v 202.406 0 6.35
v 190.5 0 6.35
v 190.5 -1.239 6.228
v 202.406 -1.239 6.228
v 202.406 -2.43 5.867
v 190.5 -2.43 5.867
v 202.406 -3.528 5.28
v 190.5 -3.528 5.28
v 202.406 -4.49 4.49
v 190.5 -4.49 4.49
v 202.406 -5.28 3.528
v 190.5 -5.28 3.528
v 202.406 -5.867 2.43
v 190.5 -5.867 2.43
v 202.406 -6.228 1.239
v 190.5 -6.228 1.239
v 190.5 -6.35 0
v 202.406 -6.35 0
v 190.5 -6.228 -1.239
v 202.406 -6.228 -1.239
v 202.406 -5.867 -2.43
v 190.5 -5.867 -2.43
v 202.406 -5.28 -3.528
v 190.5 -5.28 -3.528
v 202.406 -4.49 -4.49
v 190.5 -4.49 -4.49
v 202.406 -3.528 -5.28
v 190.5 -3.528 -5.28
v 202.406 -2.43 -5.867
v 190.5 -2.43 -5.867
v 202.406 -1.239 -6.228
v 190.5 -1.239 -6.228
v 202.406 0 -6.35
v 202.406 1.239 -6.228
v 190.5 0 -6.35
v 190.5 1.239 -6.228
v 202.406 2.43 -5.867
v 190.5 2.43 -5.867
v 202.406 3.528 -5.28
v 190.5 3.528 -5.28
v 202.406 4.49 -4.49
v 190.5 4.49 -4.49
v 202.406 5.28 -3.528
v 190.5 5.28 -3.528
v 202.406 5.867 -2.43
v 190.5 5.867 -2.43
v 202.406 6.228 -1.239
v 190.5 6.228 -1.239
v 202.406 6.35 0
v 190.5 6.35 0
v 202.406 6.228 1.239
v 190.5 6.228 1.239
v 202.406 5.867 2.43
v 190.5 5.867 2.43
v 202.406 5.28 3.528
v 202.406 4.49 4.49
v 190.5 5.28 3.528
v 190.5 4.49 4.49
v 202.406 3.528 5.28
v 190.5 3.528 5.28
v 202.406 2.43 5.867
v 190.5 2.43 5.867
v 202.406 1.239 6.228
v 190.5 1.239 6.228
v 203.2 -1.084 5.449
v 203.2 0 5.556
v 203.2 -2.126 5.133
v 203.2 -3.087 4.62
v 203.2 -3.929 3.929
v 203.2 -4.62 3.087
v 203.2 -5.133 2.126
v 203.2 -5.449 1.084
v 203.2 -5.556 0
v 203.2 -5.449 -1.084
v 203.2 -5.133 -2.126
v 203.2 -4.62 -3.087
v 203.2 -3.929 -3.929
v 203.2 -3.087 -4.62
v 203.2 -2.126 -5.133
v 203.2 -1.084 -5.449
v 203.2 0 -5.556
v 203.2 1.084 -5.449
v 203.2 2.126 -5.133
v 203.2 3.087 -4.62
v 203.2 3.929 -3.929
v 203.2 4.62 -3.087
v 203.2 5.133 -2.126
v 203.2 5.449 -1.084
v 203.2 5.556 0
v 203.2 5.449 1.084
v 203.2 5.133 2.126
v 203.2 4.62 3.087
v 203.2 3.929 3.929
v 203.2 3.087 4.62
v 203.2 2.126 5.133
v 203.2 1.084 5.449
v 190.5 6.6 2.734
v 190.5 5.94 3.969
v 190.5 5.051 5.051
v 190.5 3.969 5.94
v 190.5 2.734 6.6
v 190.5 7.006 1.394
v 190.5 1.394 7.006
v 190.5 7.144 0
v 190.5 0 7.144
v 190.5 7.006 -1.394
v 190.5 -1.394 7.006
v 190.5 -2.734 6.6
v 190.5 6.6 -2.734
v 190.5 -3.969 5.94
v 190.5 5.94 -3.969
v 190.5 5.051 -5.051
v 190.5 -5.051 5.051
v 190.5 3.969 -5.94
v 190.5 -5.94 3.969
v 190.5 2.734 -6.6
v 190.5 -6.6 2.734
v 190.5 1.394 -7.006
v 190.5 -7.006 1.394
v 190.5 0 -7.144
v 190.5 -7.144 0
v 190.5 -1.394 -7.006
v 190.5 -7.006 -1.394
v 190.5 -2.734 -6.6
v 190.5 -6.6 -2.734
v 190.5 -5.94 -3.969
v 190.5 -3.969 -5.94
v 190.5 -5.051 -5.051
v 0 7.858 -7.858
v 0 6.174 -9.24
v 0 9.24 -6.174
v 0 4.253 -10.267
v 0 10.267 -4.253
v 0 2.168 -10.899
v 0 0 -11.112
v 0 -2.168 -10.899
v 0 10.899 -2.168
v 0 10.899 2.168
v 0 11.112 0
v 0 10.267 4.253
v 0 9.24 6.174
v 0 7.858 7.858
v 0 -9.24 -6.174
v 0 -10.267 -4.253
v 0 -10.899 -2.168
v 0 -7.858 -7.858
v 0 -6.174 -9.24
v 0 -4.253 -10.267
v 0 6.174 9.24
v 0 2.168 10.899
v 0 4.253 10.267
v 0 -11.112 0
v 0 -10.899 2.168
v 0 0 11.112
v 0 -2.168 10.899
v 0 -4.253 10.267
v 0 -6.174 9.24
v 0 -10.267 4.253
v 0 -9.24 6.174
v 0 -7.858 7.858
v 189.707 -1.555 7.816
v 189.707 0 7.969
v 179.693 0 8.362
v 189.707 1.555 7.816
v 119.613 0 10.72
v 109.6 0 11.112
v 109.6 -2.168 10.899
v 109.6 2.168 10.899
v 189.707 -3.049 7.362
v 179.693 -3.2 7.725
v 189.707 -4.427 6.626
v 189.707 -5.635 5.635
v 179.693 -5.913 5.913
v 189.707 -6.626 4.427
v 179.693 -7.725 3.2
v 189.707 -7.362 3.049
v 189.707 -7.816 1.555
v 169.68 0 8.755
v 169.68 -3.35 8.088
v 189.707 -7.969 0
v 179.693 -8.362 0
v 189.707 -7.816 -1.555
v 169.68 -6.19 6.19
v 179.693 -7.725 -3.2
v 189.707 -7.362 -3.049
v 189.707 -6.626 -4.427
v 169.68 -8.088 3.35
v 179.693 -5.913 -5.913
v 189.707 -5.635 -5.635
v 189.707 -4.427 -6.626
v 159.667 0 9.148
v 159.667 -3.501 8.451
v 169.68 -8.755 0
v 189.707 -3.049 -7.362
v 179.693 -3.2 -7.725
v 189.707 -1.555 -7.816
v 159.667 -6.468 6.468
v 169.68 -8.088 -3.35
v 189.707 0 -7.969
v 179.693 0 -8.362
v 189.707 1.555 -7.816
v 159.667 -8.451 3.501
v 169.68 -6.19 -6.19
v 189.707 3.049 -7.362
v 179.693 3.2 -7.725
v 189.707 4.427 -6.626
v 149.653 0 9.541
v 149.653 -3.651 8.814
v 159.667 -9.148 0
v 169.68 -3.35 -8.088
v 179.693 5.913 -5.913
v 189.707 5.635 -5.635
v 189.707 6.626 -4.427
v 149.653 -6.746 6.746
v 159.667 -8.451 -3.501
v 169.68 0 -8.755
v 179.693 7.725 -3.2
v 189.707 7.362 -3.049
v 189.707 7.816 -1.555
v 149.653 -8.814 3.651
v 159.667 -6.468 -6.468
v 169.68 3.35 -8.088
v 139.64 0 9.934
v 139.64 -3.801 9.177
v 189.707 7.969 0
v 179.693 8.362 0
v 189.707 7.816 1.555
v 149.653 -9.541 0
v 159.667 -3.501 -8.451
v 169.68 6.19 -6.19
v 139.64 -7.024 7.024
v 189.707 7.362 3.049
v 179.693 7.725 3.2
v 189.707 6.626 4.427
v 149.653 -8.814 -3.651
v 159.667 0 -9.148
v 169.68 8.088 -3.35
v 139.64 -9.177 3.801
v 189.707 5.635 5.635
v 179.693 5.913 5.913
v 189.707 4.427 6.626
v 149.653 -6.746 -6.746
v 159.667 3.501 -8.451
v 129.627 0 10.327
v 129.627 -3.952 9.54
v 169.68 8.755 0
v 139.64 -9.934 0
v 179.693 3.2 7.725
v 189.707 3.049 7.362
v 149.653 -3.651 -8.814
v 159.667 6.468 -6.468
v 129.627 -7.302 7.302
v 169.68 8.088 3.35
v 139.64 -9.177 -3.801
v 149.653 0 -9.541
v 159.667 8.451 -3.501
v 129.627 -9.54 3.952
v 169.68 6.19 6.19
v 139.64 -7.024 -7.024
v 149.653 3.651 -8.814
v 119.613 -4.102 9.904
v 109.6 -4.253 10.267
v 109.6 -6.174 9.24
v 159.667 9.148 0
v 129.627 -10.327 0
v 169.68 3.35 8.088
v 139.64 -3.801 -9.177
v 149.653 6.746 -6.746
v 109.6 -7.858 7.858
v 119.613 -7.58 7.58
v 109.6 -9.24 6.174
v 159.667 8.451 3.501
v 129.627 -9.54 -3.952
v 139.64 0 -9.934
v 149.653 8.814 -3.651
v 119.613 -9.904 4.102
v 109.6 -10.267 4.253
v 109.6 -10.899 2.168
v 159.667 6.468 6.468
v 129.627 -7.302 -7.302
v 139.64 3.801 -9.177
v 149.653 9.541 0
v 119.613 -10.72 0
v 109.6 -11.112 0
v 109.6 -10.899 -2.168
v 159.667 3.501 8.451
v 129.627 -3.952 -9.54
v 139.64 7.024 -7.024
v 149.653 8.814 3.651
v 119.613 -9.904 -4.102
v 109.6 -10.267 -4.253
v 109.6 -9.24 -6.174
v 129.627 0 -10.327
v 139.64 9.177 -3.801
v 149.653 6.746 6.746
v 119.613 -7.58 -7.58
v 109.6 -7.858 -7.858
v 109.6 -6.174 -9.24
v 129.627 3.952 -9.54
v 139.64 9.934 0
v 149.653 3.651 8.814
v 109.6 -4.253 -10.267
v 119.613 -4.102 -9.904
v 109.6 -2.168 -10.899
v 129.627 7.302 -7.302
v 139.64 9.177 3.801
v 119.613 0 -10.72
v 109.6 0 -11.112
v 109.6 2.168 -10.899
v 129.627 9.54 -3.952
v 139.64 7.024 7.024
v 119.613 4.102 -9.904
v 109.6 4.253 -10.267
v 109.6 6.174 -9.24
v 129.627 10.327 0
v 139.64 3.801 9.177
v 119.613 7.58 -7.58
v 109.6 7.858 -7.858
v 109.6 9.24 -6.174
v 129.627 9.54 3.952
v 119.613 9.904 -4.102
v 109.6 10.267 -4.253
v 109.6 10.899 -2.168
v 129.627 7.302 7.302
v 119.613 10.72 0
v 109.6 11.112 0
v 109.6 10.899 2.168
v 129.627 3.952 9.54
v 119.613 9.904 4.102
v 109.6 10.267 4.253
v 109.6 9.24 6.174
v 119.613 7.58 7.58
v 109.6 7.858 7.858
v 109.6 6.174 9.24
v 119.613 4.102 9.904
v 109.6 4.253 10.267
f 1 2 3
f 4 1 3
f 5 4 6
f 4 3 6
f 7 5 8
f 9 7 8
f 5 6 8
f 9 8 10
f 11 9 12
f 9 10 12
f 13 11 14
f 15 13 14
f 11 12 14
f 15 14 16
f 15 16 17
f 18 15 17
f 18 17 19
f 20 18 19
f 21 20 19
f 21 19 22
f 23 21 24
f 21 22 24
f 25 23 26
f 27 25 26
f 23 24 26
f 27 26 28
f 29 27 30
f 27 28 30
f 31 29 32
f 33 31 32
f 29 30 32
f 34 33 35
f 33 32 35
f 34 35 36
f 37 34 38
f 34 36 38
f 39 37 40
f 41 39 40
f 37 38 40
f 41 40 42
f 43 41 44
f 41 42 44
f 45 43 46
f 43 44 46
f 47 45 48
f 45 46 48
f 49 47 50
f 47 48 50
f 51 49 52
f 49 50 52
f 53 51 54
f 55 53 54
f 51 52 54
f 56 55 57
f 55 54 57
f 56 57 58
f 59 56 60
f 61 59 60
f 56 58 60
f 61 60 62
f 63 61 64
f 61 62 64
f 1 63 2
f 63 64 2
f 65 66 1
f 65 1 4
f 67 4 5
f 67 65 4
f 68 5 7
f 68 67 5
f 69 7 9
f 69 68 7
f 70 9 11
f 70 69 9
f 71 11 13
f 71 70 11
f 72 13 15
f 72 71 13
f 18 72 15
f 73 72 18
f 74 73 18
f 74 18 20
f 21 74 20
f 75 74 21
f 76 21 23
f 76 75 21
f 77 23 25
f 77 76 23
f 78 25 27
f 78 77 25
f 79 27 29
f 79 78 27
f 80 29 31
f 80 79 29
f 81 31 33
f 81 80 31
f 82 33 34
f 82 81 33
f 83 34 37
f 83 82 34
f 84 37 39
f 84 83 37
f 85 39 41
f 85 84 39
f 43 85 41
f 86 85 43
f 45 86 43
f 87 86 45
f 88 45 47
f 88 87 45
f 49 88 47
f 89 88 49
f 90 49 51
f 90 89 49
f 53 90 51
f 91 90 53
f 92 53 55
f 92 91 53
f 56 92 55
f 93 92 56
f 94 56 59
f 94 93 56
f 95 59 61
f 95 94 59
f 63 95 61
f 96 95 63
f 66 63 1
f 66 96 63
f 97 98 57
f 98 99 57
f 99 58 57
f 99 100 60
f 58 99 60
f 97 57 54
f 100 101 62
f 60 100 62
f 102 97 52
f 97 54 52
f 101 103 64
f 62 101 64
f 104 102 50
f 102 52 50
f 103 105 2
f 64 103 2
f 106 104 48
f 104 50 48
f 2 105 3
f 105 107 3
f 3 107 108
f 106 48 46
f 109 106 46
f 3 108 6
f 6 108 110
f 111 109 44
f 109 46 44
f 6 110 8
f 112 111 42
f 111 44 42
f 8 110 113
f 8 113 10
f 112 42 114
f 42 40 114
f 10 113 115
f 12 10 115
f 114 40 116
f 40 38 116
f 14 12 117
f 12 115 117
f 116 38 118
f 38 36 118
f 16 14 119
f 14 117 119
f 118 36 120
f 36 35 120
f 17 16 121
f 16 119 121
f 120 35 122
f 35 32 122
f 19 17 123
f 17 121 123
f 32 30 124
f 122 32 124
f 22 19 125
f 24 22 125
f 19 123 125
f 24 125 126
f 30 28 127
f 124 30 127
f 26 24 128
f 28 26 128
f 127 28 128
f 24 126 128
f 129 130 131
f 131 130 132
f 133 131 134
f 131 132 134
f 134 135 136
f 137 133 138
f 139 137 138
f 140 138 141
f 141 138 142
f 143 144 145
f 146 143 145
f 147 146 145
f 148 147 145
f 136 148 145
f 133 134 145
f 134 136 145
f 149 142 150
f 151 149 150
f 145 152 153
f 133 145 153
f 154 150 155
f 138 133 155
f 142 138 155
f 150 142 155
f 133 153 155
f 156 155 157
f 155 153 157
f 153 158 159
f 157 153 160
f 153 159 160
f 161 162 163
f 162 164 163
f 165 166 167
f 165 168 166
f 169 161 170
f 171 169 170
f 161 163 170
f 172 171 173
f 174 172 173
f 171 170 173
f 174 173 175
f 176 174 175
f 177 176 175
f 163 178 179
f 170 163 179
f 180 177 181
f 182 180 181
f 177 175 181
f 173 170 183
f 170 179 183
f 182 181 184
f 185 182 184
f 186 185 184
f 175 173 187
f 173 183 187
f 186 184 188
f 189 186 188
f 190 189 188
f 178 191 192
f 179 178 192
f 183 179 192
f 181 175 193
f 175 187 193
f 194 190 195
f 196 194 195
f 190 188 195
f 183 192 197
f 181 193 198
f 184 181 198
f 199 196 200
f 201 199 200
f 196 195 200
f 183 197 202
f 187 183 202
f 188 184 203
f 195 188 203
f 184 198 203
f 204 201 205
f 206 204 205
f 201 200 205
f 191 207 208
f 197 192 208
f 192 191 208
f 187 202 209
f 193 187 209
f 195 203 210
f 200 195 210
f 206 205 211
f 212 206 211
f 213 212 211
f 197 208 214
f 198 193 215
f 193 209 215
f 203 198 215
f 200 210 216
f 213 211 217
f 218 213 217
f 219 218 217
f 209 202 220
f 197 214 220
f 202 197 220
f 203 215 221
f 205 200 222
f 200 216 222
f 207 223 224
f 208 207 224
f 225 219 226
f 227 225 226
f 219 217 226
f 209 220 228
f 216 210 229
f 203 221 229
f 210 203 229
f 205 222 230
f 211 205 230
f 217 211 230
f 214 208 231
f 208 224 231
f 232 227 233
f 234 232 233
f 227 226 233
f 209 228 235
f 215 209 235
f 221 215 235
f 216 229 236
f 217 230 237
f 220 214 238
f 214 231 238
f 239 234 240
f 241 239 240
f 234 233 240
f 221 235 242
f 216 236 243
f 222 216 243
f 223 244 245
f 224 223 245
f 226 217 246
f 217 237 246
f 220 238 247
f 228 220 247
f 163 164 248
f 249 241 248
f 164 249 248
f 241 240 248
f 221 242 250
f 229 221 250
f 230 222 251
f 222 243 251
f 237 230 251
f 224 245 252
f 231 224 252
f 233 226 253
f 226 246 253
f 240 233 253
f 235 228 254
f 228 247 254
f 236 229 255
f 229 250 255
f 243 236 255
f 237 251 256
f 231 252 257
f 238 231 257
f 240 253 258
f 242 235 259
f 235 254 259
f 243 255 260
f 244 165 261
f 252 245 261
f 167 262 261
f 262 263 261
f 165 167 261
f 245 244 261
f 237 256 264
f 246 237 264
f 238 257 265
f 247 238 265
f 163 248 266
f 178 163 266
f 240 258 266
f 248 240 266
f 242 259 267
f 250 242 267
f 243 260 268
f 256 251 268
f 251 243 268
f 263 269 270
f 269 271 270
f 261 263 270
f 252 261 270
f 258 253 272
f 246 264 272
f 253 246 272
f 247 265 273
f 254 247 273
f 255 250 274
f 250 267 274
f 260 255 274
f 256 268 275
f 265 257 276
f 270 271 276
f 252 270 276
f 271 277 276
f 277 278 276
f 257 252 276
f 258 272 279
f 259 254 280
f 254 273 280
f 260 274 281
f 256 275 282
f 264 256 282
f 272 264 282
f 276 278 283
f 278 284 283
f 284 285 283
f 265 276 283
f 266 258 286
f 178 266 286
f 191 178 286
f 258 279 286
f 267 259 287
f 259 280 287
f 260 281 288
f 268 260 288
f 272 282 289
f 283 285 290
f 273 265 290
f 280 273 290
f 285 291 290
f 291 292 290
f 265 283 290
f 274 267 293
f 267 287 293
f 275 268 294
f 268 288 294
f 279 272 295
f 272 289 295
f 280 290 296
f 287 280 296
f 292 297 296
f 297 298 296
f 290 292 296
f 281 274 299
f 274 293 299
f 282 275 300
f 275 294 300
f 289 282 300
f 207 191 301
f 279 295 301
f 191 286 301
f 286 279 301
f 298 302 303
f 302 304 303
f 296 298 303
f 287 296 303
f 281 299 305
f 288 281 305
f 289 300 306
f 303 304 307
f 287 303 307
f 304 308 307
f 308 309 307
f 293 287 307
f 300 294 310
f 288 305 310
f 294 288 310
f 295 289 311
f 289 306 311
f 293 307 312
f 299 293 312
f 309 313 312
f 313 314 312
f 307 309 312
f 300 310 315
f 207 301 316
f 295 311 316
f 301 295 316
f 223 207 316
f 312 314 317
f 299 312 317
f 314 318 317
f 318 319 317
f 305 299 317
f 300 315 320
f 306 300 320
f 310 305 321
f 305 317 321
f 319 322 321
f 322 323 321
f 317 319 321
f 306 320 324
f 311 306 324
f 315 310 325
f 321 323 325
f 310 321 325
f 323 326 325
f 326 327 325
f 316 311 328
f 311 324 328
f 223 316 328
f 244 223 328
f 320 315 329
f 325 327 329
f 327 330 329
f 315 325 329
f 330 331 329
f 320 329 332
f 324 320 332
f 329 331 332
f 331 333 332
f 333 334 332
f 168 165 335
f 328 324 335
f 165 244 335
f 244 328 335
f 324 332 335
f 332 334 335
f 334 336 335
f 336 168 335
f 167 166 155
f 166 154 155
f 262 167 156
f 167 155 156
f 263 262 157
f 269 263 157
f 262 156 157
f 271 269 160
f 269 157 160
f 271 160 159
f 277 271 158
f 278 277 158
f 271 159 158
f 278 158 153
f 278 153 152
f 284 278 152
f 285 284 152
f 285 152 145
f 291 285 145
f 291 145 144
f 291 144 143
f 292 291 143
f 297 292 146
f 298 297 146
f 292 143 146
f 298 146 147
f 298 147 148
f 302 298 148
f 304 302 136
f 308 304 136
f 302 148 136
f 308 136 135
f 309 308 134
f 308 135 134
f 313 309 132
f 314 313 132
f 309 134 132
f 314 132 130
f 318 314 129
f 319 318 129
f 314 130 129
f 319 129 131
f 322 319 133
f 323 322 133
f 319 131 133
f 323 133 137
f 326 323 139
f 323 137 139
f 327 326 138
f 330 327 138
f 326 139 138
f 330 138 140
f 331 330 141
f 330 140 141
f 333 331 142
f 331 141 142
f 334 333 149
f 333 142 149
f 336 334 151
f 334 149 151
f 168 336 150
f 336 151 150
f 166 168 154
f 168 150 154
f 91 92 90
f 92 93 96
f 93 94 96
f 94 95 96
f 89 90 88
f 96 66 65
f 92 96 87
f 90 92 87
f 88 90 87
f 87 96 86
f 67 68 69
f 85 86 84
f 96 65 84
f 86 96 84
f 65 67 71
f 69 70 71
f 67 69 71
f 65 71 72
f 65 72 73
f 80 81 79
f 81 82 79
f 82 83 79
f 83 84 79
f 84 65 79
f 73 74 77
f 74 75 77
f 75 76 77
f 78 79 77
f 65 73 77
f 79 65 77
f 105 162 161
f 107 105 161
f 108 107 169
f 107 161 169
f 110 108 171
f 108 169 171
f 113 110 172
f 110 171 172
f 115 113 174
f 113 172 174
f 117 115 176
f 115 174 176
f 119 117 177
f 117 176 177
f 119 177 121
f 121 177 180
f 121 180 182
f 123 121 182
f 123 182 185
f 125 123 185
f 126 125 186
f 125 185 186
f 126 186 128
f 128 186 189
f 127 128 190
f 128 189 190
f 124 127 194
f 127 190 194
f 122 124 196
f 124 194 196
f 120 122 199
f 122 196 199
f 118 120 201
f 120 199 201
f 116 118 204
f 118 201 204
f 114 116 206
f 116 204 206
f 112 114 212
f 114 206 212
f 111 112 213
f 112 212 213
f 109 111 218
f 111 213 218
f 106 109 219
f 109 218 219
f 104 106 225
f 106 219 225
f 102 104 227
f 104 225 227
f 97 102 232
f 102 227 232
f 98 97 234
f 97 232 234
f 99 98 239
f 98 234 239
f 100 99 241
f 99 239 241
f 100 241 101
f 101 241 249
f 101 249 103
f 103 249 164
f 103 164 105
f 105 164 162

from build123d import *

# Parameters (mm, degrees)
F2_SIZE = 0.79375
F3_SIZE = 0.79375


with BuildPart() as f1:
    # F0 (on Front) → F1 (revolve)
    with BuildSketch(Plane.XZ):
        Polygon((0, 11.1125), (0, 0), (203.2, 0), (203.2, 6.35), (190.5, 6.35), (190.5, 7.9375), (109.599779, 11.1125), align=None)
    revolve(axis=Axis((101.6, 0, 0), (1, 0, 0)))

    # F2
    f2_edges = [f1.edges().sort_by_distance(p)[0] for p in [
        (190.5, 0, -7.9375),
    ]]
    chamfer(f2_edges, length=F2_SIZE)

    # F3
    f3_edges = [f1.edges().sort_by_distance(p)[0] for p in [
        (203.2, 0, -6.35),
    ]]
    chamfer(f3_edges, length=F3_SIZE)


solid = f1.part
